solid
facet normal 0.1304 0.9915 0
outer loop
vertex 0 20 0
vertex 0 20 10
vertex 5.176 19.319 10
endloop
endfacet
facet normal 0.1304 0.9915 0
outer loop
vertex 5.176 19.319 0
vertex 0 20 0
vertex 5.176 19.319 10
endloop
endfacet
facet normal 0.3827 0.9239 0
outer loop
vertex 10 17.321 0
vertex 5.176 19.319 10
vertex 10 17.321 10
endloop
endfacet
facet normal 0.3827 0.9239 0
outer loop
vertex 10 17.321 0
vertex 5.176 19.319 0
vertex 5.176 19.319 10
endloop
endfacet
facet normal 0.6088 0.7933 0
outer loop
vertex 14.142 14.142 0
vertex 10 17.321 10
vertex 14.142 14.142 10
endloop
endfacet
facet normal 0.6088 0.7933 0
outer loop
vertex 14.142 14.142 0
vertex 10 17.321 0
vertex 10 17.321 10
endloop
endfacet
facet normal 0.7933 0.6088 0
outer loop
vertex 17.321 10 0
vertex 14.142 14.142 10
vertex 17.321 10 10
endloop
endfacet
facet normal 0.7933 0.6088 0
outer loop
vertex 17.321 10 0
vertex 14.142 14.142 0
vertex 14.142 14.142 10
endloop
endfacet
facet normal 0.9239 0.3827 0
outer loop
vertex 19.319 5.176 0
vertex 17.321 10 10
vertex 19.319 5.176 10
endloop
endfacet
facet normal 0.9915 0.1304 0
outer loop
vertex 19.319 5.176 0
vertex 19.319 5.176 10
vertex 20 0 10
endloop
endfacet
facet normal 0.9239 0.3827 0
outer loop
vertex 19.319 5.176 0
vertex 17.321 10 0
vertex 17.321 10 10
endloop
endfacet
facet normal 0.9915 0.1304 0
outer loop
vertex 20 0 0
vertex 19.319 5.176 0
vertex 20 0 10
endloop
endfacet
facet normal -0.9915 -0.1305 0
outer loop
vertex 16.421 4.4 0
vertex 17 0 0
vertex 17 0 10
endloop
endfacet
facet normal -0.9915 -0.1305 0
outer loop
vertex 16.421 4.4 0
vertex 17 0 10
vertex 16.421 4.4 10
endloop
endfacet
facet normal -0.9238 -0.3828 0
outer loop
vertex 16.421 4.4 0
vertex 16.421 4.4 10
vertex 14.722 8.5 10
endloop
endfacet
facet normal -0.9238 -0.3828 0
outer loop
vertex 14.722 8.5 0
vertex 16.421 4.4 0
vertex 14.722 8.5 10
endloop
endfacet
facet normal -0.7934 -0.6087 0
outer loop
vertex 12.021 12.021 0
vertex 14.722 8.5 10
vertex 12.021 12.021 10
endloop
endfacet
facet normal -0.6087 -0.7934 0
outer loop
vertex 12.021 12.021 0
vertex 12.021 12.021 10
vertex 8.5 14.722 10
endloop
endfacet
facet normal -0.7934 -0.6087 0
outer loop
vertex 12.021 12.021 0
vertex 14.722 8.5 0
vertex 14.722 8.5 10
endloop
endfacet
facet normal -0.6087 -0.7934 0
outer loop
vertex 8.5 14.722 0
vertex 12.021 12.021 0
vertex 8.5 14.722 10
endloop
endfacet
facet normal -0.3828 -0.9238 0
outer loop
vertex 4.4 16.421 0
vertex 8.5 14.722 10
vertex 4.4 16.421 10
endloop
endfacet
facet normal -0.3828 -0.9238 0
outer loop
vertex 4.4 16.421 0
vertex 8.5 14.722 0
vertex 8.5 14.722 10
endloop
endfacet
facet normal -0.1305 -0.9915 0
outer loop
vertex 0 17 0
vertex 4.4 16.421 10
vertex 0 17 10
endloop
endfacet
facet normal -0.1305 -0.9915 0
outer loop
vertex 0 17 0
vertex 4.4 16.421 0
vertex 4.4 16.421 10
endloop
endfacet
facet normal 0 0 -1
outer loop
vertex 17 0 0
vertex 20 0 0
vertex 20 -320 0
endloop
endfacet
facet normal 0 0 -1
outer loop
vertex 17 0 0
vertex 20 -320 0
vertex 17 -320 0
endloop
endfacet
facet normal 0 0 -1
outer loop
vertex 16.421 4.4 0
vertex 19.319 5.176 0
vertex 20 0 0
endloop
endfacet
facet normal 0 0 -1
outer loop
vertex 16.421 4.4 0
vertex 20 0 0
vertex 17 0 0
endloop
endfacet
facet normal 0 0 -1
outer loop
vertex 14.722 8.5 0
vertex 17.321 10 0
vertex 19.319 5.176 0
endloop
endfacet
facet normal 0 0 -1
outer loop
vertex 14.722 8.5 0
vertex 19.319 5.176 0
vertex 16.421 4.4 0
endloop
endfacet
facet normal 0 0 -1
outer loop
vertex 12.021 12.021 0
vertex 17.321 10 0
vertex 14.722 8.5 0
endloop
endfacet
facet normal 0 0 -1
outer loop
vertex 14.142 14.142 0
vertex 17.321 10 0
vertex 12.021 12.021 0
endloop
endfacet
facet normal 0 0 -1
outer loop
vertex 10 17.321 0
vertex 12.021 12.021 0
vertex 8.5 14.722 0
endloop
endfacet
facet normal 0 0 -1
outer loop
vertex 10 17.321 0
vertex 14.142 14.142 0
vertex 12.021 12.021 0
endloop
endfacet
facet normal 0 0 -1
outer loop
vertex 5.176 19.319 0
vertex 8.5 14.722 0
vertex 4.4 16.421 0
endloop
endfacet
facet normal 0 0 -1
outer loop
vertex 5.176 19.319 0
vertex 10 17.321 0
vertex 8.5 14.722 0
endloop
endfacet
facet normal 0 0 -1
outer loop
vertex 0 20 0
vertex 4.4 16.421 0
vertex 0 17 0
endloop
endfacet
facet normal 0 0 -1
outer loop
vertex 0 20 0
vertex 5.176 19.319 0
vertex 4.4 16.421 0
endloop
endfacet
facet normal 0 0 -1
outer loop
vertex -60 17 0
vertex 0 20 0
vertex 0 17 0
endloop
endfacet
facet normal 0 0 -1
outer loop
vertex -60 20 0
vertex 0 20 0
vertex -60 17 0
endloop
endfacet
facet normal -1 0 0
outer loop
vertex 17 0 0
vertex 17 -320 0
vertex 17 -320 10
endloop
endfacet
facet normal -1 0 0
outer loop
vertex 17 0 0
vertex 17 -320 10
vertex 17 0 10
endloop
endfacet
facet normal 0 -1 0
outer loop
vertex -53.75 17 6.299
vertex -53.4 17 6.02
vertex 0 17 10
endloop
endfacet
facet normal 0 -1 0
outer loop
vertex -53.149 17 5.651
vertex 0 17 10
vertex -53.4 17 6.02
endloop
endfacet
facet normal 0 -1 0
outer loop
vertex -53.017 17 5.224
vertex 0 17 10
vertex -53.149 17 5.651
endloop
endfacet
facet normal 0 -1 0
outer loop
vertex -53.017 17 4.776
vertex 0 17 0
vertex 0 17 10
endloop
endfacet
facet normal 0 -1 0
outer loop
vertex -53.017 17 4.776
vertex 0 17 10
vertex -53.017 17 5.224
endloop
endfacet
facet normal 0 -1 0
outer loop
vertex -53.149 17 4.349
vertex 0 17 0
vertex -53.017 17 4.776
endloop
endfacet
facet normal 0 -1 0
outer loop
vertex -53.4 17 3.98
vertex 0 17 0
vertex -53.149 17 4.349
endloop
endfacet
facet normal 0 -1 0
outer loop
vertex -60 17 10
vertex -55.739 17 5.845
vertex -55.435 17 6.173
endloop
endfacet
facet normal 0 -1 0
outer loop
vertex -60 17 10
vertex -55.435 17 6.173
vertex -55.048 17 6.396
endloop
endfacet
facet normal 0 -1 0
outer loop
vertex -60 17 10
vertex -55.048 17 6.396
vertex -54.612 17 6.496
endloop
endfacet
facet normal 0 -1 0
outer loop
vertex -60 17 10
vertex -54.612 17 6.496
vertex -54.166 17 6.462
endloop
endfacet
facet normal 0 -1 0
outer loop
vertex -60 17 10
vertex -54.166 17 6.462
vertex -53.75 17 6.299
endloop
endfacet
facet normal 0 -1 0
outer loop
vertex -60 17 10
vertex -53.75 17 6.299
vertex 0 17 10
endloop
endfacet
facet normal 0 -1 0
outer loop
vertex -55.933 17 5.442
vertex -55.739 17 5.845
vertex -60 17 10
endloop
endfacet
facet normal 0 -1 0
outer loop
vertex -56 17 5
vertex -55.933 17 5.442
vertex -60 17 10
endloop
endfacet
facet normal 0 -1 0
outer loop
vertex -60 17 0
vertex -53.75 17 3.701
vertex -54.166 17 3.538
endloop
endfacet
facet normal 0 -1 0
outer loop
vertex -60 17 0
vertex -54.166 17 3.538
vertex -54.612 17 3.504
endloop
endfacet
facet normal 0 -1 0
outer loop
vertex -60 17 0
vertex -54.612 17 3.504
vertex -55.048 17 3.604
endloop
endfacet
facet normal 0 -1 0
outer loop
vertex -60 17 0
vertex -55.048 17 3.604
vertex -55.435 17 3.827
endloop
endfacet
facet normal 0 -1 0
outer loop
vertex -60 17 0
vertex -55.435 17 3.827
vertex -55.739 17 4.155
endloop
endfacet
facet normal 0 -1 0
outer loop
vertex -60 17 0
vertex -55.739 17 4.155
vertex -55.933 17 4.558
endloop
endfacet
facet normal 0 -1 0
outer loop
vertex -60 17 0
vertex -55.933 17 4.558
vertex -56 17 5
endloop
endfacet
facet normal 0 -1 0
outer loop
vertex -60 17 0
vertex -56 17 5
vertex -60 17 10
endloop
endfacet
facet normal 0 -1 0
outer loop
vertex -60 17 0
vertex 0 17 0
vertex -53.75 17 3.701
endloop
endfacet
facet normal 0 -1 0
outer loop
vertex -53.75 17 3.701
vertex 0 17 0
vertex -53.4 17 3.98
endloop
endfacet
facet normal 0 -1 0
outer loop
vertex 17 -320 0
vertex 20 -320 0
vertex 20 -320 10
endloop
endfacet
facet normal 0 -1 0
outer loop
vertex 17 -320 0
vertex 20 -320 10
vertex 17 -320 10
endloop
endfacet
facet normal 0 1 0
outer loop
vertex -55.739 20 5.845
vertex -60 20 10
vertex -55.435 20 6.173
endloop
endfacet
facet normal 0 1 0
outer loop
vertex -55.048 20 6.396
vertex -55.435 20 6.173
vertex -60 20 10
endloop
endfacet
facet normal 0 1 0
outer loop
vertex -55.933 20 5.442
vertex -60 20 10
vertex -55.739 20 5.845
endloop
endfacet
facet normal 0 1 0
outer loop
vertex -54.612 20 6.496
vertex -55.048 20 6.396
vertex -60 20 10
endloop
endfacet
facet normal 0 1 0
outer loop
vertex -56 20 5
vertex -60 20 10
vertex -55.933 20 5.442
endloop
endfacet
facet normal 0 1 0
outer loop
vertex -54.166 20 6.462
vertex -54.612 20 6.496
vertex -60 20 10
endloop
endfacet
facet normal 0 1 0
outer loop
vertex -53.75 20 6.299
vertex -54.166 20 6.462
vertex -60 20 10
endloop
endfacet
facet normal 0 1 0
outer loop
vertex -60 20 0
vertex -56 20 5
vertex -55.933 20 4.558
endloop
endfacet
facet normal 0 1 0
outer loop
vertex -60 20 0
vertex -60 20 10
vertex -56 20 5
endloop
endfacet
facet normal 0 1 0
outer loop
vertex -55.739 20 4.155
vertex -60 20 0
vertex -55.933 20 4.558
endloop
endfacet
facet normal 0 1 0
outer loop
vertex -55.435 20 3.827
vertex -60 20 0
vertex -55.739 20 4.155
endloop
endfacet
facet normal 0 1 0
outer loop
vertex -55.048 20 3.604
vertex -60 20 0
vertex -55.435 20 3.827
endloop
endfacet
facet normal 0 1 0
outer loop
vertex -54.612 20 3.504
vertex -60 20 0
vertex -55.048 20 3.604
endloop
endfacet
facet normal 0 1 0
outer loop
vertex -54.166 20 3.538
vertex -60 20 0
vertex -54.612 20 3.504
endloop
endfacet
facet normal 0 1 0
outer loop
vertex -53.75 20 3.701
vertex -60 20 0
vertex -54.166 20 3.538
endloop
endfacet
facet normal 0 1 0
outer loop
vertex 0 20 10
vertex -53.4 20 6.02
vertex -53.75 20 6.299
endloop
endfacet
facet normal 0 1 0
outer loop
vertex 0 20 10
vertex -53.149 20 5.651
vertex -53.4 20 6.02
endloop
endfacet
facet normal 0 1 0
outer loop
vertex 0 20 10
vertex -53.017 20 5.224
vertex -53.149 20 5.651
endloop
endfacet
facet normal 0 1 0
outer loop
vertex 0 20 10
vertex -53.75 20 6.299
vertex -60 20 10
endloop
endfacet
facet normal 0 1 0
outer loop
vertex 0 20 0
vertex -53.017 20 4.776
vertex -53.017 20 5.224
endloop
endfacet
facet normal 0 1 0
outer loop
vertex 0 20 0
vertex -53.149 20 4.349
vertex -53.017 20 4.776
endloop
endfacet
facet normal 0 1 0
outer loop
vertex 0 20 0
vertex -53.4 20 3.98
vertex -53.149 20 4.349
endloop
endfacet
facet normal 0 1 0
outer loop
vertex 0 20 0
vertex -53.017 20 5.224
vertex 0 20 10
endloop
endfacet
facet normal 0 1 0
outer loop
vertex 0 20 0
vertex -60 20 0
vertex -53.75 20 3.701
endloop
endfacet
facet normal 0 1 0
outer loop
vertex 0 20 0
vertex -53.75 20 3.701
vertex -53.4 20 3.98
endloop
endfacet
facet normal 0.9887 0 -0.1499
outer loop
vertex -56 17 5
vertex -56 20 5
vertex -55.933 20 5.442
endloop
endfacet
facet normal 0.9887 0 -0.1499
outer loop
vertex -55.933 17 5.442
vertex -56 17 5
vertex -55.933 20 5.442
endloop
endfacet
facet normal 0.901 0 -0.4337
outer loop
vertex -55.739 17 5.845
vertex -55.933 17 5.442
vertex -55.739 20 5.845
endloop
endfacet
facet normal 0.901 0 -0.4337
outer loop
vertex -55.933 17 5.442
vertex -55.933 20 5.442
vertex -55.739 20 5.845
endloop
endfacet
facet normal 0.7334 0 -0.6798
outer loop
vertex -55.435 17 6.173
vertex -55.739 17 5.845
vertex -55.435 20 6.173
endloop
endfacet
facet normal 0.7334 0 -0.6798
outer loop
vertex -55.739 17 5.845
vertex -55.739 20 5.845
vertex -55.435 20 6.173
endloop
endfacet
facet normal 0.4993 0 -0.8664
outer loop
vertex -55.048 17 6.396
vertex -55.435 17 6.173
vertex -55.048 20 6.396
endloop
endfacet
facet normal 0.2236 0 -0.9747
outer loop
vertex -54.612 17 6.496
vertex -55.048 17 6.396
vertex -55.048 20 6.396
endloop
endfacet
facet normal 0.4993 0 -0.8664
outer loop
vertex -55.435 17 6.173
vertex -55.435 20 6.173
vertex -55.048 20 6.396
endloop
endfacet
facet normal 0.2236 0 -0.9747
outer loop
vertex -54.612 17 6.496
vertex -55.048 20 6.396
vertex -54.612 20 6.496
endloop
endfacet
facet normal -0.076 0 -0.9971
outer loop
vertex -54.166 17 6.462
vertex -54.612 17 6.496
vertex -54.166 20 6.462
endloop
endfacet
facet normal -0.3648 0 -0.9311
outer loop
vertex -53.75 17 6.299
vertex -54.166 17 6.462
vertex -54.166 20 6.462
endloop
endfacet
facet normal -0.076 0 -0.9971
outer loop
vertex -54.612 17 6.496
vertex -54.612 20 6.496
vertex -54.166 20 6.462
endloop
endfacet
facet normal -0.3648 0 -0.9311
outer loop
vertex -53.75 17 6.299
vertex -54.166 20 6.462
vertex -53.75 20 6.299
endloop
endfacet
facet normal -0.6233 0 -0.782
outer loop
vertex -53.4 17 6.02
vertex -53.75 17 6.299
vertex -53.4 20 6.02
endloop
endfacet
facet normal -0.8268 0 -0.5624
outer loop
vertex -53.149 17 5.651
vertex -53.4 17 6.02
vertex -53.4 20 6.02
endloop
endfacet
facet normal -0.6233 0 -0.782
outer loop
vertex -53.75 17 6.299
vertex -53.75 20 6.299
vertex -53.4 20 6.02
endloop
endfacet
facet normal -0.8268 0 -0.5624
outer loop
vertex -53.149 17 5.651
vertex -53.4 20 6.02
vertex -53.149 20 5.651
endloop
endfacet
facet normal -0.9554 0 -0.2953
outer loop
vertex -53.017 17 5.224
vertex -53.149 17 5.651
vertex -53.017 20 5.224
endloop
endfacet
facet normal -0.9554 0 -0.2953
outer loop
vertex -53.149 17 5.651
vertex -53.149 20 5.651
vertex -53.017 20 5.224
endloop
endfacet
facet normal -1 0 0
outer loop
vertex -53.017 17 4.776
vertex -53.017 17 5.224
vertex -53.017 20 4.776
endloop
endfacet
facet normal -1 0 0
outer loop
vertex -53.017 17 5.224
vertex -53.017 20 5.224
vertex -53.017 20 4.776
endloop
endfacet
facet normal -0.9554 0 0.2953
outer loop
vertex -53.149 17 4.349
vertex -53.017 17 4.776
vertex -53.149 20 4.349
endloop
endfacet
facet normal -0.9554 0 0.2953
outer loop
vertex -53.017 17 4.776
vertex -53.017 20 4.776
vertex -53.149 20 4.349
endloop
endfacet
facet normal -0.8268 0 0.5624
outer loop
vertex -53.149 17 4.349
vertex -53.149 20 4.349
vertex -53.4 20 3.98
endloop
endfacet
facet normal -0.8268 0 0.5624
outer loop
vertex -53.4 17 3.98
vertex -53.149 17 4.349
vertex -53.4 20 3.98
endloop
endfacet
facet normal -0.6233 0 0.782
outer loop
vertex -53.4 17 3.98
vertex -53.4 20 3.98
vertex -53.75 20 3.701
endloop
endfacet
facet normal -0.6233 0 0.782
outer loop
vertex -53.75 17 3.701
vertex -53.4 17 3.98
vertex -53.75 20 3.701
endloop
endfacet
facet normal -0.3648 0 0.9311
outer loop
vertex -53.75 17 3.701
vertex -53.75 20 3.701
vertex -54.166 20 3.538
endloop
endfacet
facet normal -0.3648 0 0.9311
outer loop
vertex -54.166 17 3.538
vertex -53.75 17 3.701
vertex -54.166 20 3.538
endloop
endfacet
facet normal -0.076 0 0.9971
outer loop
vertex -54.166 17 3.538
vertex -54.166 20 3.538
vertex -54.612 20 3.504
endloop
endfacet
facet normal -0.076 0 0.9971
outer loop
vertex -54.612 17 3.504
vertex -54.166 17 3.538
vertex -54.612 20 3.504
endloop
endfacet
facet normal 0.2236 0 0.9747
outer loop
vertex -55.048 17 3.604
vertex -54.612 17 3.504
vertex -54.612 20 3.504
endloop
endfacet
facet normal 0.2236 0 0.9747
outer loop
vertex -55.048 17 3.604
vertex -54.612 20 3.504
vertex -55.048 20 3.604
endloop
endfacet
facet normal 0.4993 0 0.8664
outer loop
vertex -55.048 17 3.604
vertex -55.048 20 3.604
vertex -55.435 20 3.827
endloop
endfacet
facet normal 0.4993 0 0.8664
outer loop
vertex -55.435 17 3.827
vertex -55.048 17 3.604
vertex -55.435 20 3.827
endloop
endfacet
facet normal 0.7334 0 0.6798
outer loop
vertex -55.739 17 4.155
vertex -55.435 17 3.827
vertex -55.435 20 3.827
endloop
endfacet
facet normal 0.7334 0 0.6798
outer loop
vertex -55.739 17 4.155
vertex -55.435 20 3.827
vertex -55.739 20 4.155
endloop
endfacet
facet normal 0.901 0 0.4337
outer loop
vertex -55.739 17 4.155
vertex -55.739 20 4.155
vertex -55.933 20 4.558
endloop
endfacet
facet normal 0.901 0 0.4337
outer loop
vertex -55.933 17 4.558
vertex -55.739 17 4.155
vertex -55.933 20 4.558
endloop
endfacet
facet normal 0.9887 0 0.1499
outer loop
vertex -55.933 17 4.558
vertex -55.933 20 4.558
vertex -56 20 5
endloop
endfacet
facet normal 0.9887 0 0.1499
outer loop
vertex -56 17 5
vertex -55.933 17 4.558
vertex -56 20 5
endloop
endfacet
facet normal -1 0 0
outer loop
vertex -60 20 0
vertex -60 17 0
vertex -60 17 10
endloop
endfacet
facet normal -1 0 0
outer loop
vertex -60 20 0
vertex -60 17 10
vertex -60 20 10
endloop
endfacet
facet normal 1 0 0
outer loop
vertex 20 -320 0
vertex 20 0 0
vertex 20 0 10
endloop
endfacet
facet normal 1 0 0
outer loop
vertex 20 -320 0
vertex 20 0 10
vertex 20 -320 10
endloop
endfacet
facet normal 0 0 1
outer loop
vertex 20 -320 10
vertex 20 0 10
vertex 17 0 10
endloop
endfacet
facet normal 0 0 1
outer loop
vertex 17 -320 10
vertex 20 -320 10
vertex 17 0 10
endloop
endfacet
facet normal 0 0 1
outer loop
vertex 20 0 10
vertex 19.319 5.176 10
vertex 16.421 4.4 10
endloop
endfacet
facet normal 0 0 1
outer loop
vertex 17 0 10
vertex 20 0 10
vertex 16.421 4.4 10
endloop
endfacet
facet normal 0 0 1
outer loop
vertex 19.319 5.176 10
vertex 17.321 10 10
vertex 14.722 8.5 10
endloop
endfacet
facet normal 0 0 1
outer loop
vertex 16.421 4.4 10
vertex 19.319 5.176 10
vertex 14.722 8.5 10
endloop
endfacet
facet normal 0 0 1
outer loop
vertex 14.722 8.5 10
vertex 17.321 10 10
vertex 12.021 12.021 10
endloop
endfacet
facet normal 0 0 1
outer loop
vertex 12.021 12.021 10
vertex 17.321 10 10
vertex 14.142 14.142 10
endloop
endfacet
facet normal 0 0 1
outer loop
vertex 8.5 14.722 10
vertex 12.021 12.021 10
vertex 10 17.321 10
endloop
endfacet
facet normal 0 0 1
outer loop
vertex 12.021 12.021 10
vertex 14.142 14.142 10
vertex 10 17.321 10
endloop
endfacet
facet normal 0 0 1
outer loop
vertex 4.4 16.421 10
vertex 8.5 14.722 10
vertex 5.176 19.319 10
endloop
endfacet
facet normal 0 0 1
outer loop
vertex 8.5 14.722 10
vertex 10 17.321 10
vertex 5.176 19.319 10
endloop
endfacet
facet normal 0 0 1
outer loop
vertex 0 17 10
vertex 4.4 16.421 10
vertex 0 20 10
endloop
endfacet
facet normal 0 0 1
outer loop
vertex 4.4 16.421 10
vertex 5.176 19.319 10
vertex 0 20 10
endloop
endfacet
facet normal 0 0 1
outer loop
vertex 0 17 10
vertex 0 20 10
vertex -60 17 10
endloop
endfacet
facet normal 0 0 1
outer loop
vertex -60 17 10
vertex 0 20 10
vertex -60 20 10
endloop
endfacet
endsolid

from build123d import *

# Parameters (mm, degrees)
BOSS_EXTRUDE1_DEPTH = 10
SKETCH2_R           = 1.5
CUT_EXTRUDE1_DEPTH  = 5


with BuildPart() as part:
    # Sketch1 → Boss-Extrude1 (new body)
    with BuildSketch(Plane.XY):
        with BuildLine():
            Line((20, 0), (20, -320))
            Line((20, -320), (17, -320))
            Line((17, -320), (17, 0))
            ThreePointArc((17, 0), (12.02081528, 12.02081528), (0, 17))
            Line((0, 17), (-60, 17))
            Line((-60, 17), (-60, 20))
            Line((-60, 20), (0, 20))
            ThreePointArc((0, 20), (14.142135624, 14.142135624), (20, 0))
        make_face()
    extrude(amount=BOSS_EXTRUDE1_DEPTH)

    # Sketch2 → Cut-Extrude1 (cut)
    with BuildSketch(Plane(origin=(0, 20, 0), x_dir=(1, 0, 0), z_dir=(0, 1, 0))):
        with Locations(Location((-54.5, -5, 0), (0, 0, 180))):
            Circle(SKETCH2_R)
    extrude(amount=-CUT_EXTRUDE1_DEPTH, mode=Mode.SUBTRACT)


solid = part.part
